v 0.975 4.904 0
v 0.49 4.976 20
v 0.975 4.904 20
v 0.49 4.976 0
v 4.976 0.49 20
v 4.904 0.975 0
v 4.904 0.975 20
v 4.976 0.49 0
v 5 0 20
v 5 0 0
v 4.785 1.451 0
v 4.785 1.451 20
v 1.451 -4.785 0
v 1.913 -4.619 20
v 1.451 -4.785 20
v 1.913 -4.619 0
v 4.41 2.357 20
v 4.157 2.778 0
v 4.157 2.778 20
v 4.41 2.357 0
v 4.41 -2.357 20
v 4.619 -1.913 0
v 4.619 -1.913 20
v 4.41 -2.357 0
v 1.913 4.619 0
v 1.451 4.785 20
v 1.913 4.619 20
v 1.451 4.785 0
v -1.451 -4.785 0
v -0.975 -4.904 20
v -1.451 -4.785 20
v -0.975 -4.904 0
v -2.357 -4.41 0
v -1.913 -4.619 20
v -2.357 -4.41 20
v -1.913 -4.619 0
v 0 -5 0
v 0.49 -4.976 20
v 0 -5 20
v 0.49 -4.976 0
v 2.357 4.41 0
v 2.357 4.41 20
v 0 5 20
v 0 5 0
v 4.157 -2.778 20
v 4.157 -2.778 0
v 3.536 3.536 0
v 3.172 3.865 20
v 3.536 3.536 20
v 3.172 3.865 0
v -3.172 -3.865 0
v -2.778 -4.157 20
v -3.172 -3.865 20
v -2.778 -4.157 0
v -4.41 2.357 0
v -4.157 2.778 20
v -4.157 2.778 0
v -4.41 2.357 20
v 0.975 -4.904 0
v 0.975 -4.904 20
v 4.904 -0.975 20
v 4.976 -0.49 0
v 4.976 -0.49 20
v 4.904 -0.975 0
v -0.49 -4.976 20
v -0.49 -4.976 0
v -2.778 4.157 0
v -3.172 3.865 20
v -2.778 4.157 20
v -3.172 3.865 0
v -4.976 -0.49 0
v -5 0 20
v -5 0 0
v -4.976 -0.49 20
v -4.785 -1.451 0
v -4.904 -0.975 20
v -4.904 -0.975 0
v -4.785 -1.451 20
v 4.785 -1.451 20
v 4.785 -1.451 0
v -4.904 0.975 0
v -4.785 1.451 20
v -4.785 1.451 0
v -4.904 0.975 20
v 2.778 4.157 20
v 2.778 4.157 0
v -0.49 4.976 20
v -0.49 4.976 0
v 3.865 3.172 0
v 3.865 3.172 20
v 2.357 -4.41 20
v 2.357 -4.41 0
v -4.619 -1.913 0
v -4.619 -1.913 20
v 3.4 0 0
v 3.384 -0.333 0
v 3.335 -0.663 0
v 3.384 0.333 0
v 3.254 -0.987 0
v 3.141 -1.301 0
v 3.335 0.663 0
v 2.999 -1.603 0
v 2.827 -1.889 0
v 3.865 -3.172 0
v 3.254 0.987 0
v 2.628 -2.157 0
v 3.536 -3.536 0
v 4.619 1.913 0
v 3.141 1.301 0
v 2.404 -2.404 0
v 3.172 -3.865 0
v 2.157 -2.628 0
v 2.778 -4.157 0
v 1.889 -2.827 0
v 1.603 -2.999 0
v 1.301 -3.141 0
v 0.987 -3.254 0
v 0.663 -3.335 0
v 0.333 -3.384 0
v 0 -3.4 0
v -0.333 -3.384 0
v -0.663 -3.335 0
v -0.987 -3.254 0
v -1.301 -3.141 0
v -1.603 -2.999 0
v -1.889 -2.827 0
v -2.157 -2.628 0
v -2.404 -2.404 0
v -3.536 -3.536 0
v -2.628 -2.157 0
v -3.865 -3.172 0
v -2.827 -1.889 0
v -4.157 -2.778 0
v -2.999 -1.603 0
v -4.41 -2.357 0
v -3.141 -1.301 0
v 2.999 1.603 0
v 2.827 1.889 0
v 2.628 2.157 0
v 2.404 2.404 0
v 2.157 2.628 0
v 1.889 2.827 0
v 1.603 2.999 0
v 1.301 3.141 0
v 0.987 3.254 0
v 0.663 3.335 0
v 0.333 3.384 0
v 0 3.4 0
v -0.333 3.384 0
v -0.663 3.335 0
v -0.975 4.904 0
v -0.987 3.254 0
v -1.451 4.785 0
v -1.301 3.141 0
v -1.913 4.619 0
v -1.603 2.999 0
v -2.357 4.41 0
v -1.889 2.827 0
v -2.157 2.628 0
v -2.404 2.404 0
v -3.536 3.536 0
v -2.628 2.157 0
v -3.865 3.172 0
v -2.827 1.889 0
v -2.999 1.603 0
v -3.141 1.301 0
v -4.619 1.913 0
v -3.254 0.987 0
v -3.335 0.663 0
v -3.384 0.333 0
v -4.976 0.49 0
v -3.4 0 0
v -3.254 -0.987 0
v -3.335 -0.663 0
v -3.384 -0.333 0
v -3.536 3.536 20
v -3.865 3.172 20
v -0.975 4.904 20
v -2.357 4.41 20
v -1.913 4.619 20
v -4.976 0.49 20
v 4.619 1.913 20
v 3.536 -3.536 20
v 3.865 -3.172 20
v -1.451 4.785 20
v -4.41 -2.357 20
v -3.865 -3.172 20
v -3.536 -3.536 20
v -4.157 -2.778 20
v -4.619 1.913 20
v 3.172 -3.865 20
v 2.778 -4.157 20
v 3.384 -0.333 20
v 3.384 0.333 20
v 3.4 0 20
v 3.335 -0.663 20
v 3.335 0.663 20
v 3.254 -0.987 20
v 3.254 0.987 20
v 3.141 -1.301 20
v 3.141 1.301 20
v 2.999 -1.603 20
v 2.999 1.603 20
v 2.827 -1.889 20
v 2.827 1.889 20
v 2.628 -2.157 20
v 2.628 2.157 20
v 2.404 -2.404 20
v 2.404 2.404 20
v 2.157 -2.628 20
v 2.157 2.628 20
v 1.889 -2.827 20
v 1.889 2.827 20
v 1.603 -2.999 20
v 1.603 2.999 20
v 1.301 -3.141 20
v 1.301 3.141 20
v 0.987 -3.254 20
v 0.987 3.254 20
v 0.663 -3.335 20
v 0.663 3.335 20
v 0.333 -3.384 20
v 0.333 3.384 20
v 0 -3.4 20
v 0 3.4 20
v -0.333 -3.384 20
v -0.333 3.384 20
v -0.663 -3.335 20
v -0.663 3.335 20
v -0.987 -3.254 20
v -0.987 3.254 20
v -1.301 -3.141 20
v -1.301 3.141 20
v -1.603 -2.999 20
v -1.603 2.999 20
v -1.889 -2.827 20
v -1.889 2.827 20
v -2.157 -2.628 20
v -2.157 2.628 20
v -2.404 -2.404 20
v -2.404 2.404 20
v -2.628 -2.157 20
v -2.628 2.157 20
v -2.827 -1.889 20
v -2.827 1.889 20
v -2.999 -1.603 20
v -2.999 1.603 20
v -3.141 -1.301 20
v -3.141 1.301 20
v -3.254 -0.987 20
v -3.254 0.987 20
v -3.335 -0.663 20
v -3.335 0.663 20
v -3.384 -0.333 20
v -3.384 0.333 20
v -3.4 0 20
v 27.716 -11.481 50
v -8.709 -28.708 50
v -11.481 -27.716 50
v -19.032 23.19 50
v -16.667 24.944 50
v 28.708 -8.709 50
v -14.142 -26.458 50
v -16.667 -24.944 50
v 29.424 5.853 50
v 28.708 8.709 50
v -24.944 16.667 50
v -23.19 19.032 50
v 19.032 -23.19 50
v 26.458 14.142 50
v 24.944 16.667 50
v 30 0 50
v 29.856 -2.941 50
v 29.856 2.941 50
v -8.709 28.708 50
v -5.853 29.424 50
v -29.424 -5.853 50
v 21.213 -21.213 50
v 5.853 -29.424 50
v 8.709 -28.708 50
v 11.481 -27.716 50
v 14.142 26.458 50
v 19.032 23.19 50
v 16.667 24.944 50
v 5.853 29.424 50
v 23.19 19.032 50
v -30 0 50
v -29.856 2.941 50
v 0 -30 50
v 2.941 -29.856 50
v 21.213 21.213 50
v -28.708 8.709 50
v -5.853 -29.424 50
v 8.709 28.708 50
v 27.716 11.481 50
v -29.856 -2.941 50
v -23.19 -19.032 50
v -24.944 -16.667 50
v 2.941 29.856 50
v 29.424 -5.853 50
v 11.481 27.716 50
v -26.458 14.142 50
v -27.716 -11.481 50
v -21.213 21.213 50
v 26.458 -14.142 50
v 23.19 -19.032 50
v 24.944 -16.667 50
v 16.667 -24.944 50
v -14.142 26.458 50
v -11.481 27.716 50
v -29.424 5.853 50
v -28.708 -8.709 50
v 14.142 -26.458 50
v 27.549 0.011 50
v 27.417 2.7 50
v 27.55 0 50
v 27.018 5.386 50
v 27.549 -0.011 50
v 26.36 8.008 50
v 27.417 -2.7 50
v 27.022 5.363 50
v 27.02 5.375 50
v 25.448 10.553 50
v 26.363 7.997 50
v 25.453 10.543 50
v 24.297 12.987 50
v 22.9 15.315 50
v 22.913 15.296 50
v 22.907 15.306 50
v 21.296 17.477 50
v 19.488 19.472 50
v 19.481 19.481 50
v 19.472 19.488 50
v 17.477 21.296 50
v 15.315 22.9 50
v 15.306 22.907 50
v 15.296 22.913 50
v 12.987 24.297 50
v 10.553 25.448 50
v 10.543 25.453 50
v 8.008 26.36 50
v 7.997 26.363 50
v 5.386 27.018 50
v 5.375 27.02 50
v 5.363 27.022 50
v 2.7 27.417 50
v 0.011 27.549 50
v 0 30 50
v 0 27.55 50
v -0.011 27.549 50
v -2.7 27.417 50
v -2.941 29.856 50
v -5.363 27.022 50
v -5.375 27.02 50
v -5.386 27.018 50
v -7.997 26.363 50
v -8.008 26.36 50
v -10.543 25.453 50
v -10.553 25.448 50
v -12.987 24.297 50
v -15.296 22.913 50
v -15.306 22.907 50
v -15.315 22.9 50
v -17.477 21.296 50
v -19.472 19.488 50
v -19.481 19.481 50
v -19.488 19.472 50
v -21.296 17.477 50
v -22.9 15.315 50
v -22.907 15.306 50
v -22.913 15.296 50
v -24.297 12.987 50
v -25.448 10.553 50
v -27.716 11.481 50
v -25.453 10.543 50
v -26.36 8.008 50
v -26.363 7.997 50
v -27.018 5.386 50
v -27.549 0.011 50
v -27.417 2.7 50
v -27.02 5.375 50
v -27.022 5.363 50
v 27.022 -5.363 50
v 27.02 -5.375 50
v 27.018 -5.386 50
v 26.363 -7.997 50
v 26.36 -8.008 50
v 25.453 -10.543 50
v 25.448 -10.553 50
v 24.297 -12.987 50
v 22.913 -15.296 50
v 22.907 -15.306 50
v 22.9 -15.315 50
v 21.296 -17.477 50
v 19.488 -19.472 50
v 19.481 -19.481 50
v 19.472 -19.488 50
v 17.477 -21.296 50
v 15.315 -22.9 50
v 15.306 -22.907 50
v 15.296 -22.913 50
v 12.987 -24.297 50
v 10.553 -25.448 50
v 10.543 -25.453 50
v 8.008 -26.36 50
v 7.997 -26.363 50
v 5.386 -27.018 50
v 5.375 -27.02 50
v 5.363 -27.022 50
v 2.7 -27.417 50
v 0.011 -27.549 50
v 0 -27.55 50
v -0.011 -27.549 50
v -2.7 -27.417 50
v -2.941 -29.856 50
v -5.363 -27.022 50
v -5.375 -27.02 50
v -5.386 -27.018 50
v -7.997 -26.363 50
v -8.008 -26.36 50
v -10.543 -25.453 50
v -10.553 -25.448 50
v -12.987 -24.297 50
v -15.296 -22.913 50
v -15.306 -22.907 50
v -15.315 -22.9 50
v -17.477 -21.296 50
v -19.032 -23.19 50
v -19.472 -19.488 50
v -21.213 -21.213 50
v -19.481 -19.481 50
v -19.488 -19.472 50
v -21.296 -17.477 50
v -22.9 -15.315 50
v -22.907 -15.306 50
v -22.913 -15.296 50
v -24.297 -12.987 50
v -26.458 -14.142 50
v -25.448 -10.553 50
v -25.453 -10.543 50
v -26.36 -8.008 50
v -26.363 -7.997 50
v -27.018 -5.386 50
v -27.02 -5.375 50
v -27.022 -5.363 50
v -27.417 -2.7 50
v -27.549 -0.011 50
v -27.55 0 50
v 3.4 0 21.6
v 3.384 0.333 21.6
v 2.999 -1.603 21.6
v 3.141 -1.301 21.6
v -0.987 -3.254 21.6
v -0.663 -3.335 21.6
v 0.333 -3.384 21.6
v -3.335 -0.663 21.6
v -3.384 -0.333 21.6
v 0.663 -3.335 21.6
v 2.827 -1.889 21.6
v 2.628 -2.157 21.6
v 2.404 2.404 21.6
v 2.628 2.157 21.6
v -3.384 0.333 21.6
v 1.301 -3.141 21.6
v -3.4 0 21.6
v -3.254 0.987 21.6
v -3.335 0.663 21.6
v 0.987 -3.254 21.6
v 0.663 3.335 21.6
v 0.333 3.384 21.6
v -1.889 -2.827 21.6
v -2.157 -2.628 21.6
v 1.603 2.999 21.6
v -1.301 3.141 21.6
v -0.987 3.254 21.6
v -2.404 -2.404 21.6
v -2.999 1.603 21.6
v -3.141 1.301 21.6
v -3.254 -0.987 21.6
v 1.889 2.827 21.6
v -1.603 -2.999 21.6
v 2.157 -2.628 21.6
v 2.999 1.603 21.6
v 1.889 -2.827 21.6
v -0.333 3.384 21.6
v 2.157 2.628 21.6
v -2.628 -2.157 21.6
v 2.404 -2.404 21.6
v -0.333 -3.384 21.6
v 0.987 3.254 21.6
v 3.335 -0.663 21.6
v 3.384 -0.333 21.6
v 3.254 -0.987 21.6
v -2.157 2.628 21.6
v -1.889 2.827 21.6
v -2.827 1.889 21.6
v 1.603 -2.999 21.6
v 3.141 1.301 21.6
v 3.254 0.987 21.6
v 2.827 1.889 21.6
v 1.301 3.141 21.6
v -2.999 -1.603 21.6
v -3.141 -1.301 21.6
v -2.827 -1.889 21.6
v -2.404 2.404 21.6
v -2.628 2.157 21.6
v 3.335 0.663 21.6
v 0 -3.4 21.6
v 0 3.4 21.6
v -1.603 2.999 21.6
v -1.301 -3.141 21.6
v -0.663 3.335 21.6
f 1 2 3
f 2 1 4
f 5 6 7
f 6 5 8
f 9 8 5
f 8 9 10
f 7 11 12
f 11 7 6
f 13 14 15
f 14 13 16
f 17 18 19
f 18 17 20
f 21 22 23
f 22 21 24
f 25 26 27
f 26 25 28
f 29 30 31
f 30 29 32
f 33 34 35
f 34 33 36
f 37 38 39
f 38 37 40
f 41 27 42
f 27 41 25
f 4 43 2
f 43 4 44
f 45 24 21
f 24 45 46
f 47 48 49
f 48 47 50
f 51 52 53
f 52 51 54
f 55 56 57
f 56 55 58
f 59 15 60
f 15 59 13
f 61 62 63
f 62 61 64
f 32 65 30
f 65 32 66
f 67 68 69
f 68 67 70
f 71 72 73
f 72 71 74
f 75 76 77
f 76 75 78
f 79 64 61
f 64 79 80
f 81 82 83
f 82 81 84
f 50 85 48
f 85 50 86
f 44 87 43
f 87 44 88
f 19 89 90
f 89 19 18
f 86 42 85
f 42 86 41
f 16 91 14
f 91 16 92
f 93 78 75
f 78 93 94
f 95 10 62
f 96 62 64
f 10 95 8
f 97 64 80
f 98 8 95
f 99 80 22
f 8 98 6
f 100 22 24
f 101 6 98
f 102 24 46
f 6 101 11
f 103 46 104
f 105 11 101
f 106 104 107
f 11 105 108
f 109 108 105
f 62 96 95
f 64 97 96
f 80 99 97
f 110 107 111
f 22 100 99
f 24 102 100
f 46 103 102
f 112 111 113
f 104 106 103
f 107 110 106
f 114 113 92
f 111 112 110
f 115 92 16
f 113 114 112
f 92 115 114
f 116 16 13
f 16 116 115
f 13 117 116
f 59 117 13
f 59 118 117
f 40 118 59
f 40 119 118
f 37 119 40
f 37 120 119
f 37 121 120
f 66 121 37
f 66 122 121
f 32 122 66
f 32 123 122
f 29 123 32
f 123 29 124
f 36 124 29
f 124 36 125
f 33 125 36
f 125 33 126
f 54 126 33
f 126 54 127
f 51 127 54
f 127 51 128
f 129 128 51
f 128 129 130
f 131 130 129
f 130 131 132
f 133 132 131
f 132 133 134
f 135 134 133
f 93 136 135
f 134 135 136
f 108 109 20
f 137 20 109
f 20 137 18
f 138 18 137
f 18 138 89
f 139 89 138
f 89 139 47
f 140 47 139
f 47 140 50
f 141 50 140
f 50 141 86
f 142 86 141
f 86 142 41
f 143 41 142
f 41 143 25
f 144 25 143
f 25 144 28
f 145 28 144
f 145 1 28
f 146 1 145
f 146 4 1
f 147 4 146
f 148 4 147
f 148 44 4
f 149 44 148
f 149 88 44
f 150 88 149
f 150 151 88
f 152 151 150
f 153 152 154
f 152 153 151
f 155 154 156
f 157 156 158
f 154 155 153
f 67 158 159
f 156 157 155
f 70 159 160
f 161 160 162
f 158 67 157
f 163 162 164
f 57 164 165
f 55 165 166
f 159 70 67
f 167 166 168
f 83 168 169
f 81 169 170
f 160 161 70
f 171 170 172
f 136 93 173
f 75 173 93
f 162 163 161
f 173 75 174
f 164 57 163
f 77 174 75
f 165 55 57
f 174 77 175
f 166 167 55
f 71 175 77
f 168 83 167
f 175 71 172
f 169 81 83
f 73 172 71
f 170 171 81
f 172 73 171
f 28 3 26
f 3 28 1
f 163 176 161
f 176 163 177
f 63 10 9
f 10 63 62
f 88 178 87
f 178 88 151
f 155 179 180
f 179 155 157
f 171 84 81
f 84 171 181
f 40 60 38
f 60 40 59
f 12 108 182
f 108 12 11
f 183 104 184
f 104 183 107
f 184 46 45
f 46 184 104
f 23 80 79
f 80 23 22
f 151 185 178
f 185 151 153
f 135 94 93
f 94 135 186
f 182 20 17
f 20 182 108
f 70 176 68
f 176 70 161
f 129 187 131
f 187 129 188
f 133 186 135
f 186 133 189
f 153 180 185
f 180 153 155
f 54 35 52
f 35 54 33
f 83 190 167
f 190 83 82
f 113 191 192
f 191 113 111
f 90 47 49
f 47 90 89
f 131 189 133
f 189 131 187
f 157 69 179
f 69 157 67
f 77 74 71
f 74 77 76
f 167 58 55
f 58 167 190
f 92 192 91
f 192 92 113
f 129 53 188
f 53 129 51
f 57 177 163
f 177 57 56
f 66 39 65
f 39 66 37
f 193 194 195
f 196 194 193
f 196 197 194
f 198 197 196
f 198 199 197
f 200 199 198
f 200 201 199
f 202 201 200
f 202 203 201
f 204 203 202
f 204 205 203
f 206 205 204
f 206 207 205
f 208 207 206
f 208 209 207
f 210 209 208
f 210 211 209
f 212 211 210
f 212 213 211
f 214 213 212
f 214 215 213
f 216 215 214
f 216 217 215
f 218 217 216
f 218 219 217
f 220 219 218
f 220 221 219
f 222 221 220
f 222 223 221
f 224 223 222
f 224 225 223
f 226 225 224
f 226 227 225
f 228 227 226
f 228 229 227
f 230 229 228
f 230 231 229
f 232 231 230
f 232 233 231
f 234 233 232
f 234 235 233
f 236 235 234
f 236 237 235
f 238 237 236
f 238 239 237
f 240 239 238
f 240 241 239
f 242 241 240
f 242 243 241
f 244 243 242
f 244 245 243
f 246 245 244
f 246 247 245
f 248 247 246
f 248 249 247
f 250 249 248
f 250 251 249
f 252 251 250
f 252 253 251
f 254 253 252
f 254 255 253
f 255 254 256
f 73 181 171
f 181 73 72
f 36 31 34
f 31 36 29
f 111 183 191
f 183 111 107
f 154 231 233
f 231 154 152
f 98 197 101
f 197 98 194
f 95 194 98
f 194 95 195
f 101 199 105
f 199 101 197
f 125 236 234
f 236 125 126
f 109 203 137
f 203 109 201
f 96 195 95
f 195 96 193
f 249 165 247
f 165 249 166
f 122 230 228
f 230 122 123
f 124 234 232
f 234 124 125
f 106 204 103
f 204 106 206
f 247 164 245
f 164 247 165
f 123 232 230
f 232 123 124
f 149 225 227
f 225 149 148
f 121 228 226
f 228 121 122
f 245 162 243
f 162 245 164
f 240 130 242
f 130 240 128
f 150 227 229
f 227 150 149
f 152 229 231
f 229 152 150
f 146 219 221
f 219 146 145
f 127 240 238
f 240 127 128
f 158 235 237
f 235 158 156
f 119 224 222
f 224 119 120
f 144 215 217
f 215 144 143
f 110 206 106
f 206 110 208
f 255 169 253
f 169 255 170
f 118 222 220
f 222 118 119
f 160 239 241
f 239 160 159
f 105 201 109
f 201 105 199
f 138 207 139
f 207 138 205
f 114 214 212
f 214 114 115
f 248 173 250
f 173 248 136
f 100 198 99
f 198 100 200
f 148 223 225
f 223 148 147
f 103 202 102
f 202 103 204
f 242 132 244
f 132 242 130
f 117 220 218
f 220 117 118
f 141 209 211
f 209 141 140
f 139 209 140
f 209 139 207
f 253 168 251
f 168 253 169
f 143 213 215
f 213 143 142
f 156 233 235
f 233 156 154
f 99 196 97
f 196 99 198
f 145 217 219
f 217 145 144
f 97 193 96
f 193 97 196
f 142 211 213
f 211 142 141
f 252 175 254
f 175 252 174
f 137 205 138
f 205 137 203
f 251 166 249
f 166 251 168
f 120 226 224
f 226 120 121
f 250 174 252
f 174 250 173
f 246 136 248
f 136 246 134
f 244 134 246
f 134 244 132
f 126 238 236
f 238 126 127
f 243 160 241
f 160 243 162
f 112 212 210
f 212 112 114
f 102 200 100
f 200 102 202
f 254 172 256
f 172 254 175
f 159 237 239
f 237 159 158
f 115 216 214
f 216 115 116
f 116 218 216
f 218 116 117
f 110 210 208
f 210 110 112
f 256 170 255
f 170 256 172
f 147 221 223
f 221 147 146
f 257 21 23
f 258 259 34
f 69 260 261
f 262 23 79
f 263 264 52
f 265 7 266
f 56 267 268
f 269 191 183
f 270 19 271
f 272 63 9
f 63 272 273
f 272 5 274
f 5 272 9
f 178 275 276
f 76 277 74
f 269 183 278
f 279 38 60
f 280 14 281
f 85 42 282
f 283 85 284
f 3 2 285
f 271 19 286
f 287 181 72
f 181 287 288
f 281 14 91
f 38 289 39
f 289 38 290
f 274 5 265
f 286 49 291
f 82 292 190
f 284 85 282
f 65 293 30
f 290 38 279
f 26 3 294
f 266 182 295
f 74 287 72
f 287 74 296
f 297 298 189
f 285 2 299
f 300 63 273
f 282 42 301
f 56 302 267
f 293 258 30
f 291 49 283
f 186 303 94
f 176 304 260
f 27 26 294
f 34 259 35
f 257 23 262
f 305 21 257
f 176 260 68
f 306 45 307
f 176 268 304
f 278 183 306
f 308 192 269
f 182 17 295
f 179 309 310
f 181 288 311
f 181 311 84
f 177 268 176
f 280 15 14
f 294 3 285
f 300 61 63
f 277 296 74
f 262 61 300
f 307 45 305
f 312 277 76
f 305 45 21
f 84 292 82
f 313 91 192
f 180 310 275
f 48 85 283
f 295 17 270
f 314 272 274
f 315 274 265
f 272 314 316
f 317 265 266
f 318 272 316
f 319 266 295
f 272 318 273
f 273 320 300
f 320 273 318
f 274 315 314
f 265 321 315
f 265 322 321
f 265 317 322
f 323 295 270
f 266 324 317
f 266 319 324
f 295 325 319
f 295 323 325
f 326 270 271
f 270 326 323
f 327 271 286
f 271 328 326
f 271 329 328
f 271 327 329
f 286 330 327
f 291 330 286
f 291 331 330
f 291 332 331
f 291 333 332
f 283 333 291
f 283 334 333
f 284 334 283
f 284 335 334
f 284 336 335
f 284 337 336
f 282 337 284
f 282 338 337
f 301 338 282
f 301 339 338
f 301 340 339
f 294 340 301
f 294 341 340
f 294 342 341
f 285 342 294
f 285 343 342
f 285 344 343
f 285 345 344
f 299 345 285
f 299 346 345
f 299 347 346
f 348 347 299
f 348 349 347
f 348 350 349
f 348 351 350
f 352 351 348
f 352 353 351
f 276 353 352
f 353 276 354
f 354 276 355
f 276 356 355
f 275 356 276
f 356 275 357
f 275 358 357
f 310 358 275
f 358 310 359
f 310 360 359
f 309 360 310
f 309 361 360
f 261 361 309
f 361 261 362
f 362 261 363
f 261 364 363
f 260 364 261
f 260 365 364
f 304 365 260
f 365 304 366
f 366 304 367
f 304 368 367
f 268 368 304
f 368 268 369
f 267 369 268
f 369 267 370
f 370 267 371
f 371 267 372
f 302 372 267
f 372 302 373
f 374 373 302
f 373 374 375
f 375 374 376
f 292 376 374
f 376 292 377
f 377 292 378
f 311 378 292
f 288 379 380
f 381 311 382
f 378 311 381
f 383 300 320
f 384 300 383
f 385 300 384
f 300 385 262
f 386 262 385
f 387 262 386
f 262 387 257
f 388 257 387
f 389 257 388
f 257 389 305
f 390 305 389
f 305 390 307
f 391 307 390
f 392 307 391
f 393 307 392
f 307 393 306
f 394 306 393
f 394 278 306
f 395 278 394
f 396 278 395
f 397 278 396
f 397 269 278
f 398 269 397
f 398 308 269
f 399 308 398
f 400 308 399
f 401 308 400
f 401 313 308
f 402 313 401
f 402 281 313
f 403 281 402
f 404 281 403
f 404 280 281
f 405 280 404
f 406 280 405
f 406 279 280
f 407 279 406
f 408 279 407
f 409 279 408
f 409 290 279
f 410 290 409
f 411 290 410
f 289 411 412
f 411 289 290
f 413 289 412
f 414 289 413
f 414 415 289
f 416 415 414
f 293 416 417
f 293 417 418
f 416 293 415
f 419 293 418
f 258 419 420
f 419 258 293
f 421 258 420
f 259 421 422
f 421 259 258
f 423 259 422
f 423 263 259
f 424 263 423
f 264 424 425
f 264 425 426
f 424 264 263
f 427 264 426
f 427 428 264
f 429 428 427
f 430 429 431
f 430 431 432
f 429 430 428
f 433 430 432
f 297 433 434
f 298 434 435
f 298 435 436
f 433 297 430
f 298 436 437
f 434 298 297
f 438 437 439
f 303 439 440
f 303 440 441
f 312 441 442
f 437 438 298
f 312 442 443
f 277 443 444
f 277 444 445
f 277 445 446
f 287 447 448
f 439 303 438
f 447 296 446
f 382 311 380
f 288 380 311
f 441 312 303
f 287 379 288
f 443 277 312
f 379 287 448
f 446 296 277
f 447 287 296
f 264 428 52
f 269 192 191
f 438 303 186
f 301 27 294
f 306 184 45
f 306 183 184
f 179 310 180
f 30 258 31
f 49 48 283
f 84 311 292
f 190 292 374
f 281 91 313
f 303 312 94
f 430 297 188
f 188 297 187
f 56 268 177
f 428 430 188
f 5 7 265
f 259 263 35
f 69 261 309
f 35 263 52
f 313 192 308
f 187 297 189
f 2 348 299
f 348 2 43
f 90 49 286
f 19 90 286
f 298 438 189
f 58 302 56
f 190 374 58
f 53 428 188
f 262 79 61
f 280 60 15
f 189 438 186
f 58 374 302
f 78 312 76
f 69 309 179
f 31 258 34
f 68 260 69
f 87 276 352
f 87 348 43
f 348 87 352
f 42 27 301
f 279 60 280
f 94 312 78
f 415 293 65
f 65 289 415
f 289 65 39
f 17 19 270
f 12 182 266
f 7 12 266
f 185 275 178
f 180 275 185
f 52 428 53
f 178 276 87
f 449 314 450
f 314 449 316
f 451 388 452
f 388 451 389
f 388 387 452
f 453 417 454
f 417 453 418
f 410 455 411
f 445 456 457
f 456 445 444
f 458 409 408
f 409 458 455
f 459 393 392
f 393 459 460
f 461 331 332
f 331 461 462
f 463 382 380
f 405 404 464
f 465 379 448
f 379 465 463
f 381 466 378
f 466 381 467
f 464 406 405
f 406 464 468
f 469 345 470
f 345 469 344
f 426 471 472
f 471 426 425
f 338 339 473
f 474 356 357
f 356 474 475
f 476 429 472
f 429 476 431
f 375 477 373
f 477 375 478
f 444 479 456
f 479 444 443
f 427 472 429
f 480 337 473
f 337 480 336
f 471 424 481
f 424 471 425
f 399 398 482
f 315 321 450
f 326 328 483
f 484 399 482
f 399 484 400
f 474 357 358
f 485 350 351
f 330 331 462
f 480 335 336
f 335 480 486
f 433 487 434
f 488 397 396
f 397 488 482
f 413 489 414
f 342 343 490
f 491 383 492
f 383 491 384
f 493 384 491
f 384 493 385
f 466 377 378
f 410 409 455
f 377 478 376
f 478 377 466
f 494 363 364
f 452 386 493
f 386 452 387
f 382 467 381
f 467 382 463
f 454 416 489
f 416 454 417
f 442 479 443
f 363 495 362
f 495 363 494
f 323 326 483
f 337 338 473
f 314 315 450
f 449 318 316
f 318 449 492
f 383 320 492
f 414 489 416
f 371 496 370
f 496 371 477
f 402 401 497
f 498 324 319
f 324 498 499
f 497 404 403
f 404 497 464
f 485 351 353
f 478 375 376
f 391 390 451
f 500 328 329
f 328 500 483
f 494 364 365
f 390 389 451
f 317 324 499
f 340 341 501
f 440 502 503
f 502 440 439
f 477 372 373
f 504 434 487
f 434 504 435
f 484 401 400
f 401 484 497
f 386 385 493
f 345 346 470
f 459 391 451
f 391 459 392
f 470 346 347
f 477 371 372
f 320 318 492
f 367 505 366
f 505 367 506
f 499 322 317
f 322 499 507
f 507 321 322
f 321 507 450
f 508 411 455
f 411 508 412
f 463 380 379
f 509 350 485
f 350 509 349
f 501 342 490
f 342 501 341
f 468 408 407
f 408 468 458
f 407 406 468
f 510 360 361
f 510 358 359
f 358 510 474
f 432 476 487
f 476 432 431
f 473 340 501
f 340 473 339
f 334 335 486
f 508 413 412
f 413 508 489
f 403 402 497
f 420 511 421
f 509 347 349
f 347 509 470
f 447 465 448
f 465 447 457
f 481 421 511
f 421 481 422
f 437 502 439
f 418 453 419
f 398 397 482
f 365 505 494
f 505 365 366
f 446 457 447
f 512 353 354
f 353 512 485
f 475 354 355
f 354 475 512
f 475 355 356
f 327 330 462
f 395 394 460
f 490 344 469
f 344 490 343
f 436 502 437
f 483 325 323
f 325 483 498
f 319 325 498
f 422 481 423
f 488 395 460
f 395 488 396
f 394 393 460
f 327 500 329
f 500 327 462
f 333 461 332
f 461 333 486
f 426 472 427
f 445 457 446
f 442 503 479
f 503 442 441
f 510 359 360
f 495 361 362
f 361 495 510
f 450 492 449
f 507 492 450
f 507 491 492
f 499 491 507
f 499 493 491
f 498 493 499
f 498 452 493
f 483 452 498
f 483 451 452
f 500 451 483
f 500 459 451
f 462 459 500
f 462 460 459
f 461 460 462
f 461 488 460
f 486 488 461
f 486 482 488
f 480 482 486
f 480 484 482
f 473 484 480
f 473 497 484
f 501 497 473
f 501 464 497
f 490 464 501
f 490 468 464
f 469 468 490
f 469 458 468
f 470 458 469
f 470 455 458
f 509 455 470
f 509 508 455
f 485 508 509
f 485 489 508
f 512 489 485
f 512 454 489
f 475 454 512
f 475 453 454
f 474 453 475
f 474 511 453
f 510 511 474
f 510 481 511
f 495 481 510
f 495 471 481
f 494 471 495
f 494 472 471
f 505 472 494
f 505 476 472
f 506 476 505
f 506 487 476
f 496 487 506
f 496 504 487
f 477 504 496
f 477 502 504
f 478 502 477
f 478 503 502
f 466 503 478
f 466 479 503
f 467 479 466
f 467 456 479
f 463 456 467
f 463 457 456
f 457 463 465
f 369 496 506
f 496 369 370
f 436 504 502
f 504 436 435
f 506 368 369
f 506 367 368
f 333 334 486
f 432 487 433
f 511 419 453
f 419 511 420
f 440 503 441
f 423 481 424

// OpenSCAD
// Built by bench/smallmodels/features/compiler.py from a list of features.
$fn = 64;
difference() {
  union() {
    translate([0, 0, 0]) difference() { cylinder(d = 10, h = 20); translate([0, 0, -0.01]) cylinder(d = 6.8, h = 20.02); }
    translate([0, 0, 20]) cylinder(d1 = 10, d2 = 60, h = 30);
  }
  translate([0, 0, 21.6]) cylinder(d1 = 6.8, d2 = 56.8, h = 29.4);  // shell, wall 1.6, open top
}
